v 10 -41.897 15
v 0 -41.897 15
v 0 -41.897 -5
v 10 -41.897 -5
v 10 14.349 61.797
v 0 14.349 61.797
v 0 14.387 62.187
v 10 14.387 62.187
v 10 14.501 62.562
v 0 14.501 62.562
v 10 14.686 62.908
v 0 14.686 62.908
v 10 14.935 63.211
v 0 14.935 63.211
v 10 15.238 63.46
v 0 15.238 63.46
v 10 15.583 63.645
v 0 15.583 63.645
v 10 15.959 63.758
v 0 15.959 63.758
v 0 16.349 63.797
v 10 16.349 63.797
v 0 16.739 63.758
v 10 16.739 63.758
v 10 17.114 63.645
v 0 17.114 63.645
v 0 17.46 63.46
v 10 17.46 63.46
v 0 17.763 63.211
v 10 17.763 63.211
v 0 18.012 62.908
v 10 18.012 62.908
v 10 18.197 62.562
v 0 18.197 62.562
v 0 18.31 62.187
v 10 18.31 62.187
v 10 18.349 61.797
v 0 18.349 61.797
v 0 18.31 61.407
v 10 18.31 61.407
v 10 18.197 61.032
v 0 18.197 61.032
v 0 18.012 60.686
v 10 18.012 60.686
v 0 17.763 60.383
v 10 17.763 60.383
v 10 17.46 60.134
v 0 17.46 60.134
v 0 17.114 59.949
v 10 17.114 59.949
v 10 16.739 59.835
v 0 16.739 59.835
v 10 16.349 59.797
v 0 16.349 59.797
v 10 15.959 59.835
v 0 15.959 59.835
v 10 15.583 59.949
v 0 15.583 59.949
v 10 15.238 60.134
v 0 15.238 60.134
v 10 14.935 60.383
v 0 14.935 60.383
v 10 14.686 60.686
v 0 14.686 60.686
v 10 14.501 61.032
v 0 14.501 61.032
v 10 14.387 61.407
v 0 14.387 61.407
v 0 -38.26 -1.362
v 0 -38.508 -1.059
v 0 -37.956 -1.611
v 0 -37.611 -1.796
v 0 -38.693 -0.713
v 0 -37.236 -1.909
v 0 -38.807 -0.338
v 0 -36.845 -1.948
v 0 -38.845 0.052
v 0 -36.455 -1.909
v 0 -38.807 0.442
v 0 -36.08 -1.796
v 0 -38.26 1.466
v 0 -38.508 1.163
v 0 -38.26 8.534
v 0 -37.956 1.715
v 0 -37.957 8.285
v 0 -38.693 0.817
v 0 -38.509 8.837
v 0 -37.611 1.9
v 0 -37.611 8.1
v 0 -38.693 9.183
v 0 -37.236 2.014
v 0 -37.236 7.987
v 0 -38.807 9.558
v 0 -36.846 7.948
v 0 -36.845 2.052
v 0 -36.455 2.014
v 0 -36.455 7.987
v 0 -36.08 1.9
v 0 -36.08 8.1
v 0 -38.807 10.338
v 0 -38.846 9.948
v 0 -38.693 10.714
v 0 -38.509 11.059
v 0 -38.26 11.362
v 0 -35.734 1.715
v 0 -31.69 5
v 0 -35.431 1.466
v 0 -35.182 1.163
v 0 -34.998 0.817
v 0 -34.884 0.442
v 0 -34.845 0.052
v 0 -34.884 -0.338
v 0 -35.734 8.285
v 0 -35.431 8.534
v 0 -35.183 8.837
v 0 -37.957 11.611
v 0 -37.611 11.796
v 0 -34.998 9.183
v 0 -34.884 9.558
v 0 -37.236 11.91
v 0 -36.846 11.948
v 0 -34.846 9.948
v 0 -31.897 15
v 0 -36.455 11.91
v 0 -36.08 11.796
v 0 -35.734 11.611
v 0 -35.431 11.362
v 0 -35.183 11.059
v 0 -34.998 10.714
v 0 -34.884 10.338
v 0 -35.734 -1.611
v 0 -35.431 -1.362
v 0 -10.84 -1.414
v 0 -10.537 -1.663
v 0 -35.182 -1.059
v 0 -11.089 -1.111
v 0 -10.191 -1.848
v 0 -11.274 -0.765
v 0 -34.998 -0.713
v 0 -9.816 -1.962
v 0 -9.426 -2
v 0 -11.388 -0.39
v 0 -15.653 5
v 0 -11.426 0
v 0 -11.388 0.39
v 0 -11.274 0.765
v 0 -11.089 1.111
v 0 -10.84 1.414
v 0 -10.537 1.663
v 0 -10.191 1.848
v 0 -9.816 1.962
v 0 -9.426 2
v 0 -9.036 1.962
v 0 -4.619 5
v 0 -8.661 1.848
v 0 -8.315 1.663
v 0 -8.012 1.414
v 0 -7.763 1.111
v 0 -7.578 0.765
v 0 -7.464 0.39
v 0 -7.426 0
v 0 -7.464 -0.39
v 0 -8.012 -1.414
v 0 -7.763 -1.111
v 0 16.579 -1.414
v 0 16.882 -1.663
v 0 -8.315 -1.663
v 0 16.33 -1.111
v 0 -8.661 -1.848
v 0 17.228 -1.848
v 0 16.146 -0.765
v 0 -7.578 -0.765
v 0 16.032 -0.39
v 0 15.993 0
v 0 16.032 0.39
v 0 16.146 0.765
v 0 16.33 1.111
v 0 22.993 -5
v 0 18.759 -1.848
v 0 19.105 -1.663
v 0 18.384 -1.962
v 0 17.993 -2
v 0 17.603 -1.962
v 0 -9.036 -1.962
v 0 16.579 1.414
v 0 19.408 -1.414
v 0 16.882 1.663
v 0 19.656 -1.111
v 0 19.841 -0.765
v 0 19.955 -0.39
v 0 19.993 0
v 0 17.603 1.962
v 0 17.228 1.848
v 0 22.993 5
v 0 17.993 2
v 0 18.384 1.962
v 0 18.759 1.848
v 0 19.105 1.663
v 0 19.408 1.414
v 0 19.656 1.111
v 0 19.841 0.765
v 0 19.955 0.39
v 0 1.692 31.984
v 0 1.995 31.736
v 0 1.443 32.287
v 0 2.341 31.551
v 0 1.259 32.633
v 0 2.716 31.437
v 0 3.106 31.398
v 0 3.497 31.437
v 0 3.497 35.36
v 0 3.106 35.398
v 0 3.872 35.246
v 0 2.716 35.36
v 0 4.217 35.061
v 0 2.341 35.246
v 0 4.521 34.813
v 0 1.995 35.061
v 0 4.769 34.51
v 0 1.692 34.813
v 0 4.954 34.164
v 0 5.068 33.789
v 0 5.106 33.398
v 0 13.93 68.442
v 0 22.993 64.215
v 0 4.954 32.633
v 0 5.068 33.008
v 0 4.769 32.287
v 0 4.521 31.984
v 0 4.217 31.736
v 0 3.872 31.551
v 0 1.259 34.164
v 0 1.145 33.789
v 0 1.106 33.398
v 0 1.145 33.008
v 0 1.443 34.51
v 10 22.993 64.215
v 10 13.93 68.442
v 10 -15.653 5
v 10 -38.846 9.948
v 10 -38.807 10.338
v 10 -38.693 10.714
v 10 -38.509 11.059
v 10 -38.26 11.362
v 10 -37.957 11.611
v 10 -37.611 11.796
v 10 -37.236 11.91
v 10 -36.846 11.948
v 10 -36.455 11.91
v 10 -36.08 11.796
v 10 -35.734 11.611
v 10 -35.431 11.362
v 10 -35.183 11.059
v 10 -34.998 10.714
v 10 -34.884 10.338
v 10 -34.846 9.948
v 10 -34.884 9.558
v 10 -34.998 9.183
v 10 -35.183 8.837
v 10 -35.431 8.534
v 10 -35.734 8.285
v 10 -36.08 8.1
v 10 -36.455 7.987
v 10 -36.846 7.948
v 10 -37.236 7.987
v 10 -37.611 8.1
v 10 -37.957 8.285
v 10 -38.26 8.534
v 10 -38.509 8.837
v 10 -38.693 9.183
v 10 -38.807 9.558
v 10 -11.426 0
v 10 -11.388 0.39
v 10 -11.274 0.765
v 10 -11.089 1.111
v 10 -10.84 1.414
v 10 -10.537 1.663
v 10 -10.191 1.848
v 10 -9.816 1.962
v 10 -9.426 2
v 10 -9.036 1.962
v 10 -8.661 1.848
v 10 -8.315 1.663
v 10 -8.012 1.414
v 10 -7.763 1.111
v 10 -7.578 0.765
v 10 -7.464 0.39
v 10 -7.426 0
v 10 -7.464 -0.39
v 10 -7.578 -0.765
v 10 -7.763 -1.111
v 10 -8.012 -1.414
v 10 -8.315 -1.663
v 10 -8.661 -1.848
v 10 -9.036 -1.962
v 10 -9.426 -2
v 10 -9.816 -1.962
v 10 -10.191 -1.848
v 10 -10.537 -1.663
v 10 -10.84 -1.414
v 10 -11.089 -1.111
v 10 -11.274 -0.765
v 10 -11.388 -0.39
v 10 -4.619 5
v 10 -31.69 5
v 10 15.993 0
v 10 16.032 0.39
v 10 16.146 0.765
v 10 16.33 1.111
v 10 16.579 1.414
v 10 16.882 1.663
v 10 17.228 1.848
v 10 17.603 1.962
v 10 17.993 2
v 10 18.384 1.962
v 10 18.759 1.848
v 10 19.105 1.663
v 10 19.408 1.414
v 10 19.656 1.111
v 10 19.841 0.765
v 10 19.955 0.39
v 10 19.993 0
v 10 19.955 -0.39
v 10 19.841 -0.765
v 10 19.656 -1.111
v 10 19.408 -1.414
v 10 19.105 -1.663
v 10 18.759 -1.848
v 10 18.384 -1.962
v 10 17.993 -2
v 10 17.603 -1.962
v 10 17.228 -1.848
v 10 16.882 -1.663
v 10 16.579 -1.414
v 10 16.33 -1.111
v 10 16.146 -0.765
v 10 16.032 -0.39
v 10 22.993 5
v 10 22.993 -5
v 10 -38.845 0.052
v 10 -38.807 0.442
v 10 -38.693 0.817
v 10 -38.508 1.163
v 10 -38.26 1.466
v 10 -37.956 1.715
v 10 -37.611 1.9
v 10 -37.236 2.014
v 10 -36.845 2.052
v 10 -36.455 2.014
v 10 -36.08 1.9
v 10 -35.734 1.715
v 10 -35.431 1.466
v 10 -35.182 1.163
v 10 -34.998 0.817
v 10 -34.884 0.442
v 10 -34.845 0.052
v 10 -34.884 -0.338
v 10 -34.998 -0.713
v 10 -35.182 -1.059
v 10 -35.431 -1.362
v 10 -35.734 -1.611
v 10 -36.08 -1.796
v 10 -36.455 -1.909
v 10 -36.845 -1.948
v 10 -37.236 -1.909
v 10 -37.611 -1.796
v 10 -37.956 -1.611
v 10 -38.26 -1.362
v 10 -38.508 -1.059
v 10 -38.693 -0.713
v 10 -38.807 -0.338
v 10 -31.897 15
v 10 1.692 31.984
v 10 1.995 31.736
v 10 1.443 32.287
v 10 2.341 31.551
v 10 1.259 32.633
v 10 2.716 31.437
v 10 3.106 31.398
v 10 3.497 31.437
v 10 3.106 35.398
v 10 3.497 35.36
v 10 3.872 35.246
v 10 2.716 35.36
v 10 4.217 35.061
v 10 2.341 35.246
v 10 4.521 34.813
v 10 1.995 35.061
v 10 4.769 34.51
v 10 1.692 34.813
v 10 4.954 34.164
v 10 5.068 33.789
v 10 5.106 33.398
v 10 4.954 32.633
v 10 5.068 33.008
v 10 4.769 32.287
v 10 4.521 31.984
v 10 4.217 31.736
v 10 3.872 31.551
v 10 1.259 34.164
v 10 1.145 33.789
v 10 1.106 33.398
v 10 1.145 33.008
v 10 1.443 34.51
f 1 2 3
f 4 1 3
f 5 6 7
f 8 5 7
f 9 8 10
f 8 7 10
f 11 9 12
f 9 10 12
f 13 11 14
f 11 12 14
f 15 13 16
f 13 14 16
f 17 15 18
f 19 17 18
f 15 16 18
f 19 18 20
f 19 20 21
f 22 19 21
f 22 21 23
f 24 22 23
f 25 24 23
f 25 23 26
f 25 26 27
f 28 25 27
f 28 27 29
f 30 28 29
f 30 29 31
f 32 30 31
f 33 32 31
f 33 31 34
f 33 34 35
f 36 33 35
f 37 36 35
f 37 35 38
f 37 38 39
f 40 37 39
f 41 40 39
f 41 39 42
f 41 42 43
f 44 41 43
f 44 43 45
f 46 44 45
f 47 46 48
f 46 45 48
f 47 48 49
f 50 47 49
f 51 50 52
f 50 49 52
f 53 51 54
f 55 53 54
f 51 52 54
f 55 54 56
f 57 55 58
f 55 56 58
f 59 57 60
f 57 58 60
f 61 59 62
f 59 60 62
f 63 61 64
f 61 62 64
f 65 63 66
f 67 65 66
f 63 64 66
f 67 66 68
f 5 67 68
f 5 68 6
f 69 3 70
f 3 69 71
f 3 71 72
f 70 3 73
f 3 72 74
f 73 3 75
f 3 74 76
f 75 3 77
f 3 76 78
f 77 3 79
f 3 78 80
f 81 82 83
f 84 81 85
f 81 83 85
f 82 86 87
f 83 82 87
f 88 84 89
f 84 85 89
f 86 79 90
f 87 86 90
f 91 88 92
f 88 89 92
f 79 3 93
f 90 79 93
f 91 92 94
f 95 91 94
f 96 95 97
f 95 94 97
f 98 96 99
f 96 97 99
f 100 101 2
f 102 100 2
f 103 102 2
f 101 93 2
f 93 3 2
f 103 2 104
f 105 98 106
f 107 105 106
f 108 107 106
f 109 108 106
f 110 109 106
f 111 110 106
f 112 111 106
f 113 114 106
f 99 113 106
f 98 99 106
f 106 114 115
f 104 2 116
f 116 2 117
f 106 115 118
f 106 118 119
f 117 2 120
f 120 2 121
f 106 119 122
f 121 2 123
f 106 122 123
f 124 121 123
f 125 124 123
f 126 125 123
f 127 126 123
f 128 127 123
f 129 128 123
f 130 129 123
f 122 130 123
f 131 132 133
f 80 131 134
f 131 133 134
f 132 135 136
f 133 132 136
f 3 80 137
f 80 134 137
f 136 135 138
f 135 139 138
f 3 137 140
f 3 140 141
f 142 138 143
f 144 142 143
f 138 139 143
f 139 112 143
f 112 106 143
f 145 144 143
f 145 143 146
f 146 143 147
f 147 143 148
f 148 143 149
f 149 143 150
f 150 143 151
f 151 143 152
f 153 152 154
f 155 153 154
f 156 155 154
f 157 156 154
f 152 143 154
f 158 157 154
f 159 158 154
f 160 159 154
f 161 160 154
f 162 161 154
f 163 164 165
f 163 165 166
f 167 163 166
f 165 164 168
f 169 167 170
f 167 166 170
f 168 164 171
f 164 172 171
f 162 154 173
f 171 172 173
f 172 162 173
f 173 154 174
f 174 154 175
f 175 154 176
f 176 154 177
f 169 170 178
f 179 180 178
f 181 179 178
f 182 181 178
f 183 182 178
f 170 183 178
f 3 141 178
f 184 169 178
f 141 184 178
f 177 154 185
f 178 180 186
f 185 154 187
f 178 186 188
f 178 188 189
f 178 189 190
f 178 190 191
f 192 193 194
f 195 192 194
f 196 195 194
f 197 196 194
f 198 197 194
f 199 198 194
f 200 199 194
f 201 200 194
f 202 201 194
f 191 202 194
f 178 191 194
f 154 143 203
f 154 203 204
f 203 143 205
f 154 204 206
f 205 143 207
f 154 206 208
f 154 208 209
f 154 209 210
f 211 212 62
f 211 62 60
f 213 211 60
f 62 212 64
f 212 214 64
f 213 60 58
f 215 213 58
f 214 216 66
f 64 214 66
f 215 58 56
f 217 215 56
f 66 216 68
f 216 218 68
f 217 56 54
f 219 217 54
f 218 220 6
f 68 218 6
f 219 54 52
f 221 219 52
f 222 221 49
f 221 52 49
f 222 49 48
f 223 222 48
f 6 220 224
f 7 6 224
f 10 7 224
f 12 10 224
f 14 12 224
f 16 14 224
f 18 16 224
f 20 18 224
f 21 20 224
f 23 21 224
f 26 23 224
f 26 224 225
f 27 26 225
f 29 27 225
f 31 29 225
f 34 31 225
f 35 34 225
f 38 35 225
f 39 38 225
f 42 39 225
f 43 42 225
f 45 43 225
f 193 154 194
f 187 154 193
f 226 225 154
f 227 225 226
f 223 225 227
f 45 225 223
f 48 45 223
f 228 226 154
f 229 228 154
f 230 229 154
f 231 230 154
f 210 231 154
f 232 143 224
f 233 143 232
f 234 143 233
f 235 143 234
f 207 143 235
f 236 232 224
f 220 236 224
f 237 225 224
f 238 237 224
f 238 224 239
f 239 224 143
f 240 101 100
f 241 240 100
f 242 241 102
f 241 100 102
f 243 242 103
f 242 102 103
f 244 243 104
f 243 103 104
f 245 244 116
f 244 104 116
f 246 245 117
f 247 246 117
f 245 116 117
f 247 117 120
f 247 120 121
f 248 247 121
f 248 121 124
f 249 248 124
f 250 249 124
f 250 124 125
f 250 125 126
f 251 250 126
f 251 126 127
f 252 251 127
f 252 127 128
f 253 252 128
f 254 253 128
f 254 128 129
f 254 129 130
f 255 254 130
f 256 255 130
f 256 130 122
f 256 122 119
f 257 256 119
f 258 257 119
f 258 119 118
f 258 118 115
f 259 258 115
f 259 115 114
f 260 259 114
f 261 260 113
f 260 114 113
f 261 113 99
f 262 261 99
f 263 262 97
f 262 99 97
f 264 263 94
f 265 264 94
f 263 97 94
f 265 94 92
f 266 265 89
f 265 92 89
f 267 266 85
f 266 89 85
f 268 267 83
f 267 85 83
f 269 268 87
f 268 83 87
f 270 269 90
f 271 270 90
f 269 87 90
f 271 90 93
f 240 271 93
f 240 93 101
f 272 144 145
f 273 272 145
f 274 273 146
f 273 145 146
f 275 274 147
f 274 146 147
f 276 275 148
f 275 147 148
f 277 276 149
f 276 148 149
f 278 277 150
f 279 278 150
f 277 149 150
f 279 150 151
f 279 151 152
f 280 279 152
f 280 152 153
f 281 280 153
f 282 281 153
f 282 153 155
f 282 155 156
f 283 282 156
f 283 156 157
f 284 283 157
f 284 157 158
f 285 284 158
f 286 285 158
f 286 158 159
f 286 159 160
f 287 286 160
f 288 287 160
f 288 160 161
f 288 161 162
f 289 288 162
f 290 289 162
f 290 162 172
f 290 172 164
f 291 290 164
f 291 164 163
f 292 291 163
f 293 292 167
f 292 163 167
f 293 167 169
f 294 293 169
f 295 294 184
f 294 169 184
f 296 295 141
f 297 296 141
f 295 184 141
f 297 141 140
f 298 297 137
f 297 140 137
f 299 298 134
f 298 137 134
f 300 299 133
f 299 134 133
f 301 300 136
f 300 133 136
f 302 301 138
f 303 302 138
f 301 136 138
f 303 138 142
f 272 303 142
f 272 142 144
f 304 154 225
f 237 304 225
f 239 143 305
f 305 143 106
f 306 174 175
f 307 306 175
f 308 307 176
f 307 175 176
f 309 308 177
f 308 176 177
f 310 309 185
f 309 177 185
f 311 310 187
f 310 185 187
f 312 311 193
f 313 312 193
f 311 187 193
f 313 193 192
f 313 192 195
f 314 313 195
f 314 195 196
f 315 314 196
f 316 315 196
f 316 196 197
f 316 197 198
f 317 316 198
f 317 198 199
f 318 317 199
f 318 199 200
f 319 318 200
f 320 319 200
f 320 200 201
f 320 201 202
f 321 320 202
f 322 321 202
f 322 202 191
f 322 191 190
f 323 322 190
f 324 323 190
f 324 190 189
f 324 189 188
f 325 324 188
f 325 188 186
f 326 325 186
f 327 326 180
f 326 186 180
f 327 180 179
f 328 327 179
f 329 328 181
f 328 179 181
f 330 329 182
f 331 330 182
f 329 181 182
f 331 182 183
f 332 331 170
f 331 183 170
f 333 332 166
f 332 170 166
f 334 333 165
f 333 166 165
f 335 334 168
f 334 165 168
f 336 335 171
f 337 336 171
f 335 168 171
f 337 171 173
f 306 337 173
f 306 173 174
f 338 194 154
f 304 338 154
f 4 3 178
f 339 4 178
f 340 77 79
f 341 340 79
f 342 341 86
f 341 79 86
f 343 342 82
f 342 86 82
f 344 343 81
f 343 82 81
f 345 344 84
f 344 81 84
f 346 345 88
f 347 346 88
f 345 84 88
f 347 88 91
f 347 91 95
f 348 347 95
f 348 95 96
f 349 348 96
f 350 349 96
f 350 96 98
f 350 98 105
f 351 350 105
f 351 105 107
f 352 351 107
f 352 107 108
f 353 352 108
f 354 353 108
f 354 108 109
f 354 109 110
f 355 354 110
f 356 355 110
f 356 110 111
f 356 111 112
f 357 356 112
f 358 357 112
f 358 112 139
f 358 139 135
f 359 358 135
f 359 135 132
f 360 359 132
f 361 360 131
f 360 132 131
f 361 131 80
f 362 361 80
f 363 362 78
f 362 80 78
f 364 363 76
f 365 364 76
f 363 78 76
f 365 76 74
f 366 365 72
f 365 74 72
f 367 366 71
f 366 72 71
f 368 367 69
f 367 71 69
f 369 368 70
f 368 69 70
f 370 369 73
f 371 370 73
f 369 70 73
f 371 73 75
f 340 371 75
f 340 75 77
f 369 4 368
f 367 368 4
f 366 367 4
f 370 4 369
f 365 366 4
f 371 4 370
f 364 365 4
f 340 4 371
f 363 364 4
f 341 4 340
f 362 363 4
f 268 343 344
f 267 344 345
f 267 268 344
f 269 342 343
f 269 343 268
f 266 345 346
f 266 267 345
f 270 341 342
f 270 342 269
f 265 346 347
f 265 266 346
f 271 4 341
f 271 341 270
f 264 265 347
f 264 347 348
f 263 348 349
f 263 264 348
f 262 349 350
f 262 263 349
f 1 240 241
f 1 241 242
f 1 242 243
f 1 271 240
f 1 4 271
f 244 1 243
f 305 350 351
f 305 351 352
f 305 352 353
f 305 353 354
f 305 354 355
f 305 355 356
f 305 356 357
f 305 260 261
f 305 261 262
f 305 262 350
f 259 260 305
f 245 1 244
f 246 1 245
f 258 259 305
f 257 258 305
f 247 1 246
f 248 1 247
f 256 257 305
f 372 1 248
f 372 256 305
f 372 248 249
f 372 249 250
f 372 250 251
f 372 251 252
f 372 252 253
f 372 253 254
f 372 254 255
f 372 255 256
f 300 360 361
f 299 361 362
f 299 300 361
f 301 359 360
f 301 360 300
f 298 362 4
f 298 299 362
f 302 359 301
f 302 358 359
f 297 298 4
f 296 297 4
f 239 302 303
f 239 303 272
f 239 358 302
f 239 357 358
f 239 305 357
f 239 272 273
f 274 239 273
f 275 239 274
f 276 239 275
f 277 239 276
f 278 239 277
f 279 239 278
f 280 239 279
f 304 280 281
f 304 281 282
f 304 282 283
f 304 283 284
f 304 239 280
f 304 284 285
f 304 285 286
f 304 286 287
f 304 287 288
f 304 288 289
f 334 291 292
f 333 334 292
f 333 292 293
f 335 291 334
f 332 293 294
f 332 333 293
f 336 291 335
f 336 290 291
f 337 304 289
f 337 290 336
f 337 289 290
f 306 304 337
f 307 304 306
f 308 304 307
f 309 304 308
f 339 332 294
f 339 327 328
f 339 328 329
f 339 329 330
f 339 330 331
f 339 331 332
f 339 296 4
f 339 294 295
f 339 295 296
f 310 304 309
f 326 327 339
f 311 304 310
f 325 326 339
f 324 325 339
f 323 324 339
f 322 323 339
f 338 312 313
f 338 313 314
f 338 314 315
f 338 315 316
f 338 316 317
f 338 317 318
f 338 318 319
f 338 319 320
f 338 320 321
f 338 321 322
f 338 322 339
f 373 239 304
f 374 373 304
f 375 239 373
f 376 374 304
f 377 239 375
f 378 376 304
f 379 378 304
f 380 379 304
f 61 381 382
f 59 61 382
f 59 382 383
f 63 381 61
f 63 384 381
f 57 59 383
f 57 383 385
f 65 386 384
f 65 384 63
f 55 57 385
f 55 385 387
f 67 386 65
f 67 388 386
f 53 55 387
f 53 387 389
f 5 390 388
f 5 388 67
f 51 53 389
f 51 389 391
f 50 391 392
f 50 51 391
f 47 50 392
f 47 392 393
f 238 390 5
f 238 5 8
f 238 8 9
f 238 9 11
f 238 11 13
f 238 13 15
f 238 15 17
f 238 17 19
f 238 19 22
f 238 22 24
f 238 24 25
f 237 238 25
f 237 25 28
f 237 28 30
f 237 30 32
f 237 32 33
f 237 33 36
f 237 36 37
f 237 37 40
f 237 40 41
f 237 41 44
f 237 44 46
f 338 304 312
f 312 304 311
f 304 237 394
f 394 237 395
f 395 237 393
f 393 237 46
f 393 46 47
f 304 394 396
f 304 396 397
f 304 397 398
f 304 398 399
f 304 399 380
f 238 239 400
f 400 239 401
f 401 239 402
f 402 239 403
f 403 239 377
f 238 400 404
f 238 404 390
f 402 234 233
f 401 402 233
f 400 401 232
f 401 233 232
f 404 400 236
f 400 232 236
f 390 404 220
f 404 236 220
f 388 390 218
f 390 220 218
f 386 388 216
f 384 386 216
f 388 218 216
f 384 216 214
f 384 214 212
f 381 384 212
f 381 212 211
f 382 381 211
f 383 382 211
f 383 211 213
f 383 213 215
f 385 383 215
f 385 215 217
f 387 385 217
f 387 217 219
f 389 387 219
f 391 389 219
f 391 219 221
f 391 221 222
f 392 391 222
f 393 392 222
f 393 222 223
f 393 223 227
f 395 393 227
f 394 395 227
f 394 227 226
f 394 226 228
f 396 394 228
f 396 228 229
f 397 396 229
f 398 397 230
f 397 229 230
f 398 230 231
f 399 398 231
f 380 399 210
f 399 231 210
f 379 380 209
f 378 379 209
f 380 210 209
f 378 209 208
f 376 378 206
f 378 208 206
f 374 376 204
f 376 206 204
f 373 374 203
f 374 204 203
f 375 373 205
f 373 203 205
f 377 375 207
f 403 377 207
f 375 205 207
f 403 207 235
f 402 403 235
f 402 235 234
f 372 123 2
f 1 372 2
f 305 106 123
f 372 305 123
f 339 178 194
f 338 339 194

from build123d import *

# Parameters (mm, degrees)
F1_DEPTH = 10
F3_D     = 4
F3_DEPTH = 12
F3_TIP   = 1.2017212381


# Not quite as in the source:
# - a feature names something its author has since deleted; it is built from what else it names


with BuildPart() as f1:
    # F0 (on Right) → F1 (new body)
    with BuildSketch(Plane.YZ):
        Polygon((22.9933855712, -5), (22.9933855712, 5), (-4.6191914314, 5), (22.9933855712, 64.2153624752), (13.9303077009, 68.4415450926), (-15.652970621, 5), (-31.6901920953, 5), (-31.8974178605, 15), (-41.8974178605, 15), (-41.8974178605, -5), align=None)
    extrude(amount=F1_DEPTH)

    # F3
    with Locations(Plane.YZ.offset(10)):
        with Locations((16.3487553273, 61.7969148487), (17.9933855712, 0), (-9.4260048308, 0), (-36.8453457878, 0.0520720727), (3.1063371506, 33.3984574243), (-36.8456114192, 9.9481935587)):
            Hole(F3_D / 2, depth=F3_DEPTH)
            with Locations((0, 0, -(F3_DEPTH + F3_TIP / 2))):  # 118° drill point
                Cone(0, F3_D / 2, F3_TIP, mode=Mode.SUBTRACT)


solid = f1.part
